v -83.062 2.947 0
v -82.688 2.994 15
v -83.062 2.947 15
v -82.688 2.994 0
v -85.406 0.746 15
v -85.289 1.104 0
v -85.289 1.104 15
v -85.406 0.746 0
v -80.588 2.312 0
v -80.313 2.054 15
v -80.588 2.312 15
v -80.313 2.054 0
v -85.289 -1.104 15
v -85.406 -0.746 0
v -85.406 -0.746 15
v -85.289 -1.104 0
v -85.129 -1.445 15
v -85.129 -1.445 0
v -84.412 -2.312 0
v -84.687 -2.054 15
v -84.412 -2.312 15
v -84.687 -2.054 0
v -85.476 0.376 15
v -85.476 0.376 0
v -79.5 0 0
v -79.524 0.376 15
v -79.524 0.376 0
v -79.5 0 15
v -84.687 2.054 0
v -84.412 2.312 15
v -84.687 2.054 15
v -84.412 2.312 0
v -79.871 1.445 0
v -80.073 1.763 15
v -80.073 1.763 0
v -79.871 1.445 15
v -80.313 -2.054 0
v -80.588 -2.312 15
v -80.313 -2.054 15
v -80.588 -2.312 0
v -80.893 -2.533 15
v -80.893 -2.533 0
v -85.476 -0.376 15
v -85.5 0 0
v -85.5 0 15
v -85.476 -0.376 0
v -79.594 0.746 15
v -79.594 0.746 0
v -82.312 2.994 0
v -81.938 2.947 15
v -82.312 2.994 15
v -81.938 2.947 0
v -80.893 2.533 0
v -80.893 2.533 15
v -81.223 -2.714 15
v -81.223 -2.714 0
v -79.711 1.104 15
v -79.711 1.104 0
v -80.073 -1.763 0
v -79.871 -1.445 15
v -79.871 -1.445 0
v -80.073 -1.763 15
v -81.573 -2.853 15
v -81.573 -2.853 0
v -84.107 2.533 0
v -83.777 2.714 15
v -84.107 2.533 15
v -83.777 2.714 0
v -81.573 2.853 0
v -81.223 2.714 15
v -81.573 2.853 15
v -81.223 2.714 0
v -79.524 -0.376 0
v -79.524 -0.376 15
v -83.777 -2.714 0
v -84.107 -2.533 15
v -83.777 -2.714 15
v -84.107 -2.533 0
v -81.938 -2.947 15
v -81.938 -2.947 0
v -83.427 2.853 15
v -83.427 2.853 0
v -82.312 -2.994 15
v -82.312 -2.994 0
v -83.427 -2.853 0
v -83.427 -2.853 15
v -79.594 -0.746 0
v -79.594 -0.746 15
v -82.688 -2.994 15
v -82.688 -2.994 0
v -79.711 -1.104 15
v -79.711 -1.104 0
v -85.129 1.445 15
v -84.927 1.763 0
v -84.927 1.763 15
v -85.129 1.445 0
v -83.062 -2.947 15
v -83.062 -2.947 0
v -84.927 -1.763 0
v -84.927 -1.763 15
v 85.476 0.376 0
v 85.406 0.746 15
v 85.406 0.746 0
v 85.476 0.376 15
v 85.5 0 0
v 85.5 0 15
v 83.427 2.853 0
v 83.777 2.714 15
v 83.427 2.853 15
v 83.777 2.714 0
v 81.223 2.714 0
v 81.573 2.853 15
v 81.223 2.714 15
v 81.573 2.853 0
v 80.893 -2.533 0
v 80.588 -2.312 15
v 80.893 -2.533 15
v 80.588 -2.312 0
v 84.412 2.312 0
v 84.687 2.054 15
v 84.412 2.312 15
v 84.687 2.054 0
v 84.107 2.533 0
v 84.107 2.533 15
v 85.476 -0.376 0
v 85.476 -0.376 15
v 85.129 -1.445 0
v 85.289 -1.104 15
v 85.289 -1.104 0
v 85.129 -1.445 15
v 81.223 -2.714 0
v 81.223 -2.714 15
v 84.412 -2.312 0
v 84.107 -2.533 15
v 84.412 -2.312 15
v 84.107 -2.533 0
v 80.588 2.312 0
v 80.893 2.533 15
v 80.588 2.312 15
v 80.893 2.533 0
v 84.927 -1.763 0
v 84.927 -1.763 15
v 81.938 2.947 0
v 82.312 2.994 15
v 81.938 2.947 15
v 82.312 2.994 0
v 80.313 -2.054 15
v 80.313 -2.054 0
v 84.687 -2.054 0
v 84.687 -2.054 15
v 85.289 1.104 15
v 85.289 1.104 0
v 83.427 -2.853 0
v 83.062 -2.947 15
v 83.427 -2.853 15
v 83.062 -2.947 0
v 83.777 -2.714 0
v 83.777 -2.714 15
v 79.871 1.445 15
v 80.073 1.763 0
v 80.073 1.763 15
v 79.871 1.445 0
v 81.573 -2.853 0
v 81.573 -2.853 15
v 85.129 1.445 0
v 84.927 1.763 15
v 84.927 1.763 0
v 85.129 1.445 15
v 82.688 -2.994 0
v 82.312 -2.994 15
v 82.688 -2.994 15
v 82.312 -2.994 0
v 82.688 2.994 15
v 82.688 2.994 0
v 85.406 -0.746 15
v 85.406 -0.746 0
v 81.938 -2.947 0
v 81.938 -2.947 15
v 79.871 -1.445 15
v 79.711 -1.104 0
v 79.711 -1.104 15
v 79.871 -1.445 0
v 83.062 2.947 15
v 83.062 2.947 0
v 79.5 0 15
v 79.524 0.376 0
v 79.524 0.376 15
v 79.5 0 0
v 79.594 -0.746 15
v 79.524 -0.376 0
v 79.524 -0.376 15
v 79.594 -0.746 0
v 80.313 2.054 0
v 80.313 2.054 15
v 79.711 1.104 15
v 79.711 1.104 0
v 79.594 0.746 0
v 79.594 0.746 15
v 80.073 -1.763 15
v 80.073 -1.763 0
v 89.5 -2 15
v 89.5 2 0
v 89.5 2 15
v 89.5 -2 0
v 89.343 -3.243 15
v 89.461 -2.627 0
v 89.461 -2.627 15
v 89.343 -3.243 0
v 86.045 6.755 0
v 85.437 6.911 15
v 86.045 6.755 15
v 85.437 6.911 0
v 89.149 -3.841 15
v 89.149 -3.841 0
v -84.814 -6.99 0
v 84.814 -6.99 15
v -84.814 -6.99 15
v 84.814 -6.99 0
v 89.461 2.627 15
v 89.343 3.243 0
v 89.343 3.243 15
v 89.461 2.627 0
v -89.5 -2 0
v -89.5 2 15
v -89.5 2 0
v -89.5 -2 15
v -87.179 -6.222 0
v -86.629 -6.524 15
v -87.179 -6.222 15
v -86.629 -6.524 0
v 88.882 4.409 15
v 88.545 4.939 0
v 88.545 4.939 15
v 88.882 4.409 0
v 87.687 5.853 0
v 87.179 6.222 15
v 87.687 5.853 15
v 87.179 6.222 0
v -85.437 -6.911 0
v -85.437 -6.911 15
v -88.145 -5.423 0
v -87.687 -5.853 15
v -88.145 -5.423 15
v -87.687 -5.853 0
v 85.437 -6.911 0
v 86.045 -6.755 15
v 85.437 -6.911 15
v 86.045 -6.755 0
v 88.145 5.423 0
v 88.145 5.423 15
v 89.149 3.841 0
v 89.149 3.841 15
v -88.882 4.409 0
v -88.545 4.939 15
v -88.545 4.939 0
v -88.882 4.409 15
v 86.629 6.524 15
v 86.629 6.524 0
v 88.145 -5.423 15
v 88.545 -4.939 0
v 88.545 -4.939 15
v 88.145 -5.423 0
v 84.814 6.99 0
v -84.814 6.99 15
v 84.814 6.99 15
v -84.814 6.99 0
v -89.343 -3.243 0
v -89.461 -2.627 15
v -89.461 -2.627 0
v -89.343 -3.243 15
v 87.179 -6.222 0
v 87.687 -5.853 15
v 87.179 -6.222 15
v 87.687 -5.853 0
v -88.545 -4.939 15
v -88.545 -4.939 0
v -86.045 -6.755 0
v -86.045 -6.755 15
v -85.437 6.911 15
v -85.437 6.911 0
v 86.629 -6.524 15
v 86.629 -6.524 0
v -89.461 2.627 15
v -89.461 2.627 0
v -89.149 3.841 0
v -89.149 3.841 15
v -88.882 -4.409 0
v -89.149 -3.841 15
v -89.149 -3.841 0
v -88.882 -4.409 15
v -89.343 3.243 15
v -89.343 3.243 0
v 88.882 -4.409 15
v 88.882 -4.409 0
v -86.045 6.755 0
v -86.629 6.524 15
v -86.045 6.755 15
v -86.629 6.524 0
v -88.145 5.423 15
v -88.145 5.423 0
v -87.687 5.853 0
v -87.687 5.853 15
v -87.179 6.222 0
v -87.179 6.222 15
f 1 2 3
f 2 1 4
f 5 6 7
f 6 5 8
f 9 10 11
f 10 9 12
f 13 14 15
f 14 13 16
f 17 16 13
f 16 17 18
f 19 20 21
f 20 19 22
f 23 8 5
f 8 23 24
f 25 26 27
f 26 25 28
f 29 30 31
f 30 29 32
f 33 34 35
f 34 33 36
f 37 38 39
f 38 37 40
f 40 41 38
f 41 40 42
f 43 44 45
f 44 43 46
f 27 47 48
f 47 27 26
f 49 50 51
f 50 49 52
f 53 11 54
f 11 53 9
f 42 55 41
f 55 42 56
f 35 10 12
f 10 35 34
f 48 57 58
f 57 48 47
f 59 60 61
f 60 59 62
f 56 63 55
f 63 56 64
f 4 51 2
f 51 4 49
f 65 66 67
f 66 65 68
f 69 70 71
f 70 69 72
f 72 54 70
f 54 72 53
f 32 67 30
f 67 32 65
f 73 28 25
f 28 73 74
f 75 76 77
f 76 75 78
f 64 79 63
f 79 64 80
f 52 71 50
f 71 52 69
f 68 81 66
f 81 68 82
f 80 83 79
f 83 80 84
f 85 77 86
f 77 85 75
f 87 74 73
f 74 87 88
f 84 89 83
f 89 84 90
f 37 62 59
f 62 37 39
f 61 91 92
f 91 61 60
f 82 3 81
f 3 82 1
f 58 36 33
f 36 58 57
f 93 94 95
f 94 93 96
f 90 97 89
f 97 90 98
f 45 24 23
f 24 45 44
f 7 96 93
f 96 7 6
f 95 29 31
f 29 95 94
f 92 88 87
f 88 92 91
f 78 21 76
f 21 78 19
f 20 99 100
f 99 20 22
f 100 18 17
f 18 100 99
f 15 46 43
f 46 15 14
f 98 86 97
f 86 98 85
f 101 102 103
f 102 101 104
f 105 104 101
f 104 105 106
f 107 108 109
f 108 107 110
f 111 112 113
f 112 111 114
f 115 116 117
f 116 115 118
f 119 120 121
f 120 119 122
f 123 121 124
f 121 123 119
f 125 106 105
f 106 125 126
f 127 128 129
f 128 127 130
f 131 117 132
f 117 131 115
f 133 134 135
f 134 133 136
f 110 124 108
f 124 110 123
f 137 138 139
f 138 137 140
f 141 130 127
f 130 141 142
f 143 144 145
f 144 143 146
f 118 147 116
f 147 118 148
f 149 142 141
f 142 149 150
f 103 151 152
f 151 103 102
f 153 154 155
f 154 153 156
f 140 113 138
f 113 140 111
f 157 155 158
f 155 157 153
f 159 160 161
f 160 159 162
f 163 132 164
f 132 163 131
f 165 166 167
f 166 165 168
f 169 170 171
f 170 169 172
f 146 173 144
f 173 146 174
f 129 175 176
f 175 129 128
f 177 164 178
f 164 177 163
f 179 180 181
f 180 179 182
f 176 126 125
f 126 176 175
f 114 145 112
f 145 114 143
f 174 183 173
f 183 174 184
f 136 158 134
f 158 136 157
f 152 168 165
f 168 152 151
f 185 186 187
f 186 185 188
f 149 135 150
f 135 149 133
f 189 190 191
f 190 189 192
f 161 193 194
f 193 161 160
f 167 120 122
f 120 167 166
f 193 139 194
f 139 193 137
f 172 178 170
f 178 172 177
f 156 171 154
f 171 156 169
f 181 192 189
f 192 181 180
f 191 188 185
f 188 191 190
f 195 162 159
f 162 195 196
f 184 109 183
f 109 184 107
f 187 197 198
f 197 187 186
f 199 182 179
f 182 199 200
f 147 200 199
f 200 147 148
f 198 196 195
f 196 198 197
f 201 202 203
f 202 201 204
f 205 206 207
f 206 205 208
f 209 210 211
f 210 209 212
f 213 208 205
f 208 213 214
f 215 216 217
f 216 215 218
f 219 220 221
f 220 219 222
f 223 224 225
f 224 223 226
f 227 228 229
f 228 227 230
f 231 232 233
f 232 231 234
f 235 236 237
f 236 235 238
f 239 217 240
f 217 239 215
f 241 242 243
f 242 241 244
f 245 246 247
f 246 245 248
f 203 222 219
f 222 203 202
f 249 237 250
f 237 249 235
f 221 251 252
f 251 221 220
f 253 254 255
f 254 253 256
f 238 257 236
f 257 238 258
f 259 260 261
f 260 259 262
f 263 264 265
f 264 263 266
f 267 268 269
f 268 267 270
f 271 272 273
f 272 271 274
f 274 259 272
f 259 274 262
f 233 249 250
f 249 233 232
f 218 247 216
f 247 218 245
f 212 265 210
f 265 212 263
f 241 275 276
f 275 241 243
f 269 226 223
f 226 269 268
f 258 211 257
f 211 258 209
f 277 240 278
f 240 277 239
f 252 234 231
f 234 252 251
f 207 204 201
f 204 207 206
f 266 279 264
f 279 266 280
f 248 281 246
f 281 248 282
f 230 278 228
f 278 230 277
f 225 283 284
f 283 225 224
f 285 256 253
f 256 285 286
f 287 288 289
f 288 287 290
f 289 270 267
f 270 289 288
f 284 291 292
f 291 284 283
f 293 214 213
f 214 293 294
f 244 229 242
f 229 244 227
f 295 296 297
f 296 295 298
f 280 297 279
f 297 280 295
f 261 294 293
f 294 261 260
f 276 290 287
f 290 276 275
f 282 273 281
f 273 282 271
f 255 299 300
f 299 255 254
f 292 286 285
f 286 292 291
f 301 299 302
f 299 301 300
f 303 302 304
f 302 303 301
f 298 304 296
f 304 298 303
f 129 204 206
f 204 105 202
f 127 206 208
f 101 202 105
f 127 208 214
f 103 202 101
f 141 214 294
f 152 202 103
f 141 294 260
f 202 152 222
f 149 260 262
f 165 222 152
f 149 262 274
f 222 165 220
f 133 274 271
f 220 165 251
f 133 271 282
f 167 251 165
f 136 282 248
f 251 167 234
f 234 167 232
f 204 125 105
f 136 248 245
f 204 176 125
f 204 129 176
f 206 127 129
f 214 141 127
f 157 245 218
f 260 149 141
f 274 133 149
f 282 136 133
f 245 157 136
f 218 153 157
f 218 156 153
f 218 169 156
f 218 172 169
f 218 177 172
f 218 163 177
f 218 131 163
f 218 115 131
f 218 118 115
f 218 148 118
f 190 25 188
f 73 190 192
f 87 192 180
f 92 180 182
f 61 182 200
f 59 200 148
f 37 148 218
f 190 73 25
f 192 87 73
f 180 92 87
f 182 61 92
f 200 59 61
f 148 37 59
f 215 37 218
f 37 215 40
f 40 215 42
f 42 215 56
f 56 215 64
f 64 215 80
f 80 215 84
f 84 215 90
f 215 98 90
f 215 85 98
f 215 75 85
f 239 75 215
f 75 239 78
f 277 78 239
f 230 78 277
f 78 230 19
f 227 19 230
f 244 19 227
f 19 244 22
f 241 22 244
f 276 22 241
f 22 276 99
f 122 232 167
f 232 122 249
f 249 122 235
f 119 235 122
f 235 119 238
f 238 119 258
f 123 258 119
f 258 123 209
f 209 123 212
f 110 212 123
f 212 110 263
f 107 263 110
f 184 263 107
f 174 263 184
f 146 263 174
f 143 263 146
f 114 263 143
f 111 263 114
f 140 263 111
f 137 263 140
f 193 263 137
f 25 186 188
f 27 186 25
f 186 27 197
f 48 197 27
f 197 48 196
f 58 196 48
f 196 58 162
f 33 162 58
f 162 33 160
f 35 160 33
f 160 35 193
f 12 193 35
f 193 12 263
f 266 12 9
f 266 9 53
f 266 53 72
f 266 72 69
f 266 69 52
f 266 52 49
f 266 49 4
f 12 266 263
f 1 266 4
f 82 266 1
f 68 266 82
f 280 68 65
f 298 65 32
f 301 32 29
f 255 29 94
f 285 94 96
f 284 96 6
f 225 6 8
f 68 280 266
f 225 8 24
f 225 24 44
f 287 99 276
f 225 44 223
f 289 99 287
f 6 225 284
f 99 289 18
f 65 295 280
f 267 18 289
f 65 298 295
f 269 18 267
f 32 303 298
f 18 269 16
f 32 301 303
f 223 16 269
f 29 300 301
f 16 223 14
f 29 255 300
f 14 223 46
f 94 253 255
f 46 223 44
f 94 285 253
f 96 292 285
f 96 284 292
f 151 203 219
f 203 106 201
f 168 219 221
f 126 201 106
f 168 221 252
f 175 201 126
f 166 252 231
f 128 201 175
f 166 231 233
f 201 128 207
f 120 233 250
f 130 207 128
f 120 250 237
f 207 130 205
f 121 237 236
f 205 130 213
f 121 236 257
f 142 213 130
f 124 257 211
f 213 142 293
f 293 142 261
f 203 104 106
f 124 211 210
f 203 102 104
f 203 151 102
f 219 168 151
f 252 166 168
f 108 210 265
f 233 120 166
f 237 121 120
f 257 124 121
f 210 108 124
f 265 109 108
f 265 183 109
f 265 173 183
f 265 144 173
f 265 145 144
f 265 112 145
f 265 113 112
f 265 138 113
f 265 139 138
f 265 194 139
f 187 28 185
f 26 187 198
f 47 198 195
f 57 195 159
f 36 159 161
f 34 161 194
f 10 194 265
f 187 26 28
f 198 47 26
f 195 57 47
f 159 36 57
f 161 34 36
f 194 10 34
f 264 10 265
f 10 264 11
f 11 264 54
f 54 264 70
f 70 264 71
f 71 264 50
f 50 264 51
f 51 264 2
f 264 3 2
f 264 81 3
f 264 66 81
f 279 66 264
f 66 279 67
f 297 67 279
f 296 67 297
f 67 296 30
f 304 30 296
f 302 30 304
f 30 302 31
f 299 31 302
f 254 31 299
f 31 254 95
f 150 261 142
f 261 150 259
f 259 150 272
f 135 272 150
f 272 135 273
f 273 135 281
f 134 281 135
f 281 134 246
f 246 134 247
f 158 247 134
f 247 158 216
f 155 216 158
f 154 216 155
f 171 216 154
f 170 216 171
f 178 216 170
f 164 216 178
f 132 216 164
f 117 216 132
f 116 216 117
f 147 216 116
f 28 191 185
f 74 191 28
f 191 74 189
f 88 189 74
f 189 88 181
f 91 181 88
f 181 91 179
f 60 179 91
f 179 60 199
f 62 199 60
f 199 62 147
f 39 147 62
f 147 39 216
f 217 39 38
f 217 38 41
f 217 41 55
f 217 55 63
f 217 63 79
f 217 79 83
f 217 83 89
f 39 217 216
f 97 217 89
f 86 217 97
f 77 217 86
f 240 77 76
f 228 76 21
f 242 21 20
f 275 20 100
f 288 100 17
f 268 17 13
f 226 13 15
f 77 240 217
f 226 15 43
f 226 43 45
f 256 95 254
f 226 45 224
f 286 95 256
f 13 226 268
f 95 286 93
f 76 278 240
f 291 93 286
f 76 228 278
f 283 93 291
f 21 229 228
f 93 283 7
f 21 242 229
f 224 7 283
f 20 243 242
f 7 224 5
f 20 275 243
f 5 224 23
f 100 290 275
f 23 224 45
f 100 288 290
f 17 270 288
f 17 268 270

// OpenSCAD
$fn = 50;


difference() {
	union() {
		hull() {
			translate(v = [-84.5000000000, 2.0000000000, 0]) {
				cylinder(h = 15, r = 5);
			}
			translate(v = [84.5000000000, 2.0000000000, 0]) {
				cylinder(h = 15, r = 5);
			}
			translate(v = [-84.5000000000, -2.0000000000, 0]) {
				cylinder(h = 15, r = 5);
			}
			translate(v = [84.5000000000, -2.0000000000, 0]) {
				cylinder(h = 15, r = 5);
			}
		}
	}
	union() {
		translate(v = [-82.5000000000, 0.0000000000, -100.0000000000]) {
			cylinder(h = 200, r = 3.0000000000);
		}
		translate(v = [-82.5000000000, 0.0000000000, -100.0000000000]) {
			cylinder(h = 200, r = 3.0000000000);
		}
		translate(v = [82.5000000000, 0.0000000000, -100.0000000000]) {
			cylinder(h = 200, r = 3.0000000000);
		}
		translate(v = [82.5000000000, 0.0000000000, -100.0000000000]) {
			cylinder(h = 200, r = 3.0000000000);
		}
	}
}
